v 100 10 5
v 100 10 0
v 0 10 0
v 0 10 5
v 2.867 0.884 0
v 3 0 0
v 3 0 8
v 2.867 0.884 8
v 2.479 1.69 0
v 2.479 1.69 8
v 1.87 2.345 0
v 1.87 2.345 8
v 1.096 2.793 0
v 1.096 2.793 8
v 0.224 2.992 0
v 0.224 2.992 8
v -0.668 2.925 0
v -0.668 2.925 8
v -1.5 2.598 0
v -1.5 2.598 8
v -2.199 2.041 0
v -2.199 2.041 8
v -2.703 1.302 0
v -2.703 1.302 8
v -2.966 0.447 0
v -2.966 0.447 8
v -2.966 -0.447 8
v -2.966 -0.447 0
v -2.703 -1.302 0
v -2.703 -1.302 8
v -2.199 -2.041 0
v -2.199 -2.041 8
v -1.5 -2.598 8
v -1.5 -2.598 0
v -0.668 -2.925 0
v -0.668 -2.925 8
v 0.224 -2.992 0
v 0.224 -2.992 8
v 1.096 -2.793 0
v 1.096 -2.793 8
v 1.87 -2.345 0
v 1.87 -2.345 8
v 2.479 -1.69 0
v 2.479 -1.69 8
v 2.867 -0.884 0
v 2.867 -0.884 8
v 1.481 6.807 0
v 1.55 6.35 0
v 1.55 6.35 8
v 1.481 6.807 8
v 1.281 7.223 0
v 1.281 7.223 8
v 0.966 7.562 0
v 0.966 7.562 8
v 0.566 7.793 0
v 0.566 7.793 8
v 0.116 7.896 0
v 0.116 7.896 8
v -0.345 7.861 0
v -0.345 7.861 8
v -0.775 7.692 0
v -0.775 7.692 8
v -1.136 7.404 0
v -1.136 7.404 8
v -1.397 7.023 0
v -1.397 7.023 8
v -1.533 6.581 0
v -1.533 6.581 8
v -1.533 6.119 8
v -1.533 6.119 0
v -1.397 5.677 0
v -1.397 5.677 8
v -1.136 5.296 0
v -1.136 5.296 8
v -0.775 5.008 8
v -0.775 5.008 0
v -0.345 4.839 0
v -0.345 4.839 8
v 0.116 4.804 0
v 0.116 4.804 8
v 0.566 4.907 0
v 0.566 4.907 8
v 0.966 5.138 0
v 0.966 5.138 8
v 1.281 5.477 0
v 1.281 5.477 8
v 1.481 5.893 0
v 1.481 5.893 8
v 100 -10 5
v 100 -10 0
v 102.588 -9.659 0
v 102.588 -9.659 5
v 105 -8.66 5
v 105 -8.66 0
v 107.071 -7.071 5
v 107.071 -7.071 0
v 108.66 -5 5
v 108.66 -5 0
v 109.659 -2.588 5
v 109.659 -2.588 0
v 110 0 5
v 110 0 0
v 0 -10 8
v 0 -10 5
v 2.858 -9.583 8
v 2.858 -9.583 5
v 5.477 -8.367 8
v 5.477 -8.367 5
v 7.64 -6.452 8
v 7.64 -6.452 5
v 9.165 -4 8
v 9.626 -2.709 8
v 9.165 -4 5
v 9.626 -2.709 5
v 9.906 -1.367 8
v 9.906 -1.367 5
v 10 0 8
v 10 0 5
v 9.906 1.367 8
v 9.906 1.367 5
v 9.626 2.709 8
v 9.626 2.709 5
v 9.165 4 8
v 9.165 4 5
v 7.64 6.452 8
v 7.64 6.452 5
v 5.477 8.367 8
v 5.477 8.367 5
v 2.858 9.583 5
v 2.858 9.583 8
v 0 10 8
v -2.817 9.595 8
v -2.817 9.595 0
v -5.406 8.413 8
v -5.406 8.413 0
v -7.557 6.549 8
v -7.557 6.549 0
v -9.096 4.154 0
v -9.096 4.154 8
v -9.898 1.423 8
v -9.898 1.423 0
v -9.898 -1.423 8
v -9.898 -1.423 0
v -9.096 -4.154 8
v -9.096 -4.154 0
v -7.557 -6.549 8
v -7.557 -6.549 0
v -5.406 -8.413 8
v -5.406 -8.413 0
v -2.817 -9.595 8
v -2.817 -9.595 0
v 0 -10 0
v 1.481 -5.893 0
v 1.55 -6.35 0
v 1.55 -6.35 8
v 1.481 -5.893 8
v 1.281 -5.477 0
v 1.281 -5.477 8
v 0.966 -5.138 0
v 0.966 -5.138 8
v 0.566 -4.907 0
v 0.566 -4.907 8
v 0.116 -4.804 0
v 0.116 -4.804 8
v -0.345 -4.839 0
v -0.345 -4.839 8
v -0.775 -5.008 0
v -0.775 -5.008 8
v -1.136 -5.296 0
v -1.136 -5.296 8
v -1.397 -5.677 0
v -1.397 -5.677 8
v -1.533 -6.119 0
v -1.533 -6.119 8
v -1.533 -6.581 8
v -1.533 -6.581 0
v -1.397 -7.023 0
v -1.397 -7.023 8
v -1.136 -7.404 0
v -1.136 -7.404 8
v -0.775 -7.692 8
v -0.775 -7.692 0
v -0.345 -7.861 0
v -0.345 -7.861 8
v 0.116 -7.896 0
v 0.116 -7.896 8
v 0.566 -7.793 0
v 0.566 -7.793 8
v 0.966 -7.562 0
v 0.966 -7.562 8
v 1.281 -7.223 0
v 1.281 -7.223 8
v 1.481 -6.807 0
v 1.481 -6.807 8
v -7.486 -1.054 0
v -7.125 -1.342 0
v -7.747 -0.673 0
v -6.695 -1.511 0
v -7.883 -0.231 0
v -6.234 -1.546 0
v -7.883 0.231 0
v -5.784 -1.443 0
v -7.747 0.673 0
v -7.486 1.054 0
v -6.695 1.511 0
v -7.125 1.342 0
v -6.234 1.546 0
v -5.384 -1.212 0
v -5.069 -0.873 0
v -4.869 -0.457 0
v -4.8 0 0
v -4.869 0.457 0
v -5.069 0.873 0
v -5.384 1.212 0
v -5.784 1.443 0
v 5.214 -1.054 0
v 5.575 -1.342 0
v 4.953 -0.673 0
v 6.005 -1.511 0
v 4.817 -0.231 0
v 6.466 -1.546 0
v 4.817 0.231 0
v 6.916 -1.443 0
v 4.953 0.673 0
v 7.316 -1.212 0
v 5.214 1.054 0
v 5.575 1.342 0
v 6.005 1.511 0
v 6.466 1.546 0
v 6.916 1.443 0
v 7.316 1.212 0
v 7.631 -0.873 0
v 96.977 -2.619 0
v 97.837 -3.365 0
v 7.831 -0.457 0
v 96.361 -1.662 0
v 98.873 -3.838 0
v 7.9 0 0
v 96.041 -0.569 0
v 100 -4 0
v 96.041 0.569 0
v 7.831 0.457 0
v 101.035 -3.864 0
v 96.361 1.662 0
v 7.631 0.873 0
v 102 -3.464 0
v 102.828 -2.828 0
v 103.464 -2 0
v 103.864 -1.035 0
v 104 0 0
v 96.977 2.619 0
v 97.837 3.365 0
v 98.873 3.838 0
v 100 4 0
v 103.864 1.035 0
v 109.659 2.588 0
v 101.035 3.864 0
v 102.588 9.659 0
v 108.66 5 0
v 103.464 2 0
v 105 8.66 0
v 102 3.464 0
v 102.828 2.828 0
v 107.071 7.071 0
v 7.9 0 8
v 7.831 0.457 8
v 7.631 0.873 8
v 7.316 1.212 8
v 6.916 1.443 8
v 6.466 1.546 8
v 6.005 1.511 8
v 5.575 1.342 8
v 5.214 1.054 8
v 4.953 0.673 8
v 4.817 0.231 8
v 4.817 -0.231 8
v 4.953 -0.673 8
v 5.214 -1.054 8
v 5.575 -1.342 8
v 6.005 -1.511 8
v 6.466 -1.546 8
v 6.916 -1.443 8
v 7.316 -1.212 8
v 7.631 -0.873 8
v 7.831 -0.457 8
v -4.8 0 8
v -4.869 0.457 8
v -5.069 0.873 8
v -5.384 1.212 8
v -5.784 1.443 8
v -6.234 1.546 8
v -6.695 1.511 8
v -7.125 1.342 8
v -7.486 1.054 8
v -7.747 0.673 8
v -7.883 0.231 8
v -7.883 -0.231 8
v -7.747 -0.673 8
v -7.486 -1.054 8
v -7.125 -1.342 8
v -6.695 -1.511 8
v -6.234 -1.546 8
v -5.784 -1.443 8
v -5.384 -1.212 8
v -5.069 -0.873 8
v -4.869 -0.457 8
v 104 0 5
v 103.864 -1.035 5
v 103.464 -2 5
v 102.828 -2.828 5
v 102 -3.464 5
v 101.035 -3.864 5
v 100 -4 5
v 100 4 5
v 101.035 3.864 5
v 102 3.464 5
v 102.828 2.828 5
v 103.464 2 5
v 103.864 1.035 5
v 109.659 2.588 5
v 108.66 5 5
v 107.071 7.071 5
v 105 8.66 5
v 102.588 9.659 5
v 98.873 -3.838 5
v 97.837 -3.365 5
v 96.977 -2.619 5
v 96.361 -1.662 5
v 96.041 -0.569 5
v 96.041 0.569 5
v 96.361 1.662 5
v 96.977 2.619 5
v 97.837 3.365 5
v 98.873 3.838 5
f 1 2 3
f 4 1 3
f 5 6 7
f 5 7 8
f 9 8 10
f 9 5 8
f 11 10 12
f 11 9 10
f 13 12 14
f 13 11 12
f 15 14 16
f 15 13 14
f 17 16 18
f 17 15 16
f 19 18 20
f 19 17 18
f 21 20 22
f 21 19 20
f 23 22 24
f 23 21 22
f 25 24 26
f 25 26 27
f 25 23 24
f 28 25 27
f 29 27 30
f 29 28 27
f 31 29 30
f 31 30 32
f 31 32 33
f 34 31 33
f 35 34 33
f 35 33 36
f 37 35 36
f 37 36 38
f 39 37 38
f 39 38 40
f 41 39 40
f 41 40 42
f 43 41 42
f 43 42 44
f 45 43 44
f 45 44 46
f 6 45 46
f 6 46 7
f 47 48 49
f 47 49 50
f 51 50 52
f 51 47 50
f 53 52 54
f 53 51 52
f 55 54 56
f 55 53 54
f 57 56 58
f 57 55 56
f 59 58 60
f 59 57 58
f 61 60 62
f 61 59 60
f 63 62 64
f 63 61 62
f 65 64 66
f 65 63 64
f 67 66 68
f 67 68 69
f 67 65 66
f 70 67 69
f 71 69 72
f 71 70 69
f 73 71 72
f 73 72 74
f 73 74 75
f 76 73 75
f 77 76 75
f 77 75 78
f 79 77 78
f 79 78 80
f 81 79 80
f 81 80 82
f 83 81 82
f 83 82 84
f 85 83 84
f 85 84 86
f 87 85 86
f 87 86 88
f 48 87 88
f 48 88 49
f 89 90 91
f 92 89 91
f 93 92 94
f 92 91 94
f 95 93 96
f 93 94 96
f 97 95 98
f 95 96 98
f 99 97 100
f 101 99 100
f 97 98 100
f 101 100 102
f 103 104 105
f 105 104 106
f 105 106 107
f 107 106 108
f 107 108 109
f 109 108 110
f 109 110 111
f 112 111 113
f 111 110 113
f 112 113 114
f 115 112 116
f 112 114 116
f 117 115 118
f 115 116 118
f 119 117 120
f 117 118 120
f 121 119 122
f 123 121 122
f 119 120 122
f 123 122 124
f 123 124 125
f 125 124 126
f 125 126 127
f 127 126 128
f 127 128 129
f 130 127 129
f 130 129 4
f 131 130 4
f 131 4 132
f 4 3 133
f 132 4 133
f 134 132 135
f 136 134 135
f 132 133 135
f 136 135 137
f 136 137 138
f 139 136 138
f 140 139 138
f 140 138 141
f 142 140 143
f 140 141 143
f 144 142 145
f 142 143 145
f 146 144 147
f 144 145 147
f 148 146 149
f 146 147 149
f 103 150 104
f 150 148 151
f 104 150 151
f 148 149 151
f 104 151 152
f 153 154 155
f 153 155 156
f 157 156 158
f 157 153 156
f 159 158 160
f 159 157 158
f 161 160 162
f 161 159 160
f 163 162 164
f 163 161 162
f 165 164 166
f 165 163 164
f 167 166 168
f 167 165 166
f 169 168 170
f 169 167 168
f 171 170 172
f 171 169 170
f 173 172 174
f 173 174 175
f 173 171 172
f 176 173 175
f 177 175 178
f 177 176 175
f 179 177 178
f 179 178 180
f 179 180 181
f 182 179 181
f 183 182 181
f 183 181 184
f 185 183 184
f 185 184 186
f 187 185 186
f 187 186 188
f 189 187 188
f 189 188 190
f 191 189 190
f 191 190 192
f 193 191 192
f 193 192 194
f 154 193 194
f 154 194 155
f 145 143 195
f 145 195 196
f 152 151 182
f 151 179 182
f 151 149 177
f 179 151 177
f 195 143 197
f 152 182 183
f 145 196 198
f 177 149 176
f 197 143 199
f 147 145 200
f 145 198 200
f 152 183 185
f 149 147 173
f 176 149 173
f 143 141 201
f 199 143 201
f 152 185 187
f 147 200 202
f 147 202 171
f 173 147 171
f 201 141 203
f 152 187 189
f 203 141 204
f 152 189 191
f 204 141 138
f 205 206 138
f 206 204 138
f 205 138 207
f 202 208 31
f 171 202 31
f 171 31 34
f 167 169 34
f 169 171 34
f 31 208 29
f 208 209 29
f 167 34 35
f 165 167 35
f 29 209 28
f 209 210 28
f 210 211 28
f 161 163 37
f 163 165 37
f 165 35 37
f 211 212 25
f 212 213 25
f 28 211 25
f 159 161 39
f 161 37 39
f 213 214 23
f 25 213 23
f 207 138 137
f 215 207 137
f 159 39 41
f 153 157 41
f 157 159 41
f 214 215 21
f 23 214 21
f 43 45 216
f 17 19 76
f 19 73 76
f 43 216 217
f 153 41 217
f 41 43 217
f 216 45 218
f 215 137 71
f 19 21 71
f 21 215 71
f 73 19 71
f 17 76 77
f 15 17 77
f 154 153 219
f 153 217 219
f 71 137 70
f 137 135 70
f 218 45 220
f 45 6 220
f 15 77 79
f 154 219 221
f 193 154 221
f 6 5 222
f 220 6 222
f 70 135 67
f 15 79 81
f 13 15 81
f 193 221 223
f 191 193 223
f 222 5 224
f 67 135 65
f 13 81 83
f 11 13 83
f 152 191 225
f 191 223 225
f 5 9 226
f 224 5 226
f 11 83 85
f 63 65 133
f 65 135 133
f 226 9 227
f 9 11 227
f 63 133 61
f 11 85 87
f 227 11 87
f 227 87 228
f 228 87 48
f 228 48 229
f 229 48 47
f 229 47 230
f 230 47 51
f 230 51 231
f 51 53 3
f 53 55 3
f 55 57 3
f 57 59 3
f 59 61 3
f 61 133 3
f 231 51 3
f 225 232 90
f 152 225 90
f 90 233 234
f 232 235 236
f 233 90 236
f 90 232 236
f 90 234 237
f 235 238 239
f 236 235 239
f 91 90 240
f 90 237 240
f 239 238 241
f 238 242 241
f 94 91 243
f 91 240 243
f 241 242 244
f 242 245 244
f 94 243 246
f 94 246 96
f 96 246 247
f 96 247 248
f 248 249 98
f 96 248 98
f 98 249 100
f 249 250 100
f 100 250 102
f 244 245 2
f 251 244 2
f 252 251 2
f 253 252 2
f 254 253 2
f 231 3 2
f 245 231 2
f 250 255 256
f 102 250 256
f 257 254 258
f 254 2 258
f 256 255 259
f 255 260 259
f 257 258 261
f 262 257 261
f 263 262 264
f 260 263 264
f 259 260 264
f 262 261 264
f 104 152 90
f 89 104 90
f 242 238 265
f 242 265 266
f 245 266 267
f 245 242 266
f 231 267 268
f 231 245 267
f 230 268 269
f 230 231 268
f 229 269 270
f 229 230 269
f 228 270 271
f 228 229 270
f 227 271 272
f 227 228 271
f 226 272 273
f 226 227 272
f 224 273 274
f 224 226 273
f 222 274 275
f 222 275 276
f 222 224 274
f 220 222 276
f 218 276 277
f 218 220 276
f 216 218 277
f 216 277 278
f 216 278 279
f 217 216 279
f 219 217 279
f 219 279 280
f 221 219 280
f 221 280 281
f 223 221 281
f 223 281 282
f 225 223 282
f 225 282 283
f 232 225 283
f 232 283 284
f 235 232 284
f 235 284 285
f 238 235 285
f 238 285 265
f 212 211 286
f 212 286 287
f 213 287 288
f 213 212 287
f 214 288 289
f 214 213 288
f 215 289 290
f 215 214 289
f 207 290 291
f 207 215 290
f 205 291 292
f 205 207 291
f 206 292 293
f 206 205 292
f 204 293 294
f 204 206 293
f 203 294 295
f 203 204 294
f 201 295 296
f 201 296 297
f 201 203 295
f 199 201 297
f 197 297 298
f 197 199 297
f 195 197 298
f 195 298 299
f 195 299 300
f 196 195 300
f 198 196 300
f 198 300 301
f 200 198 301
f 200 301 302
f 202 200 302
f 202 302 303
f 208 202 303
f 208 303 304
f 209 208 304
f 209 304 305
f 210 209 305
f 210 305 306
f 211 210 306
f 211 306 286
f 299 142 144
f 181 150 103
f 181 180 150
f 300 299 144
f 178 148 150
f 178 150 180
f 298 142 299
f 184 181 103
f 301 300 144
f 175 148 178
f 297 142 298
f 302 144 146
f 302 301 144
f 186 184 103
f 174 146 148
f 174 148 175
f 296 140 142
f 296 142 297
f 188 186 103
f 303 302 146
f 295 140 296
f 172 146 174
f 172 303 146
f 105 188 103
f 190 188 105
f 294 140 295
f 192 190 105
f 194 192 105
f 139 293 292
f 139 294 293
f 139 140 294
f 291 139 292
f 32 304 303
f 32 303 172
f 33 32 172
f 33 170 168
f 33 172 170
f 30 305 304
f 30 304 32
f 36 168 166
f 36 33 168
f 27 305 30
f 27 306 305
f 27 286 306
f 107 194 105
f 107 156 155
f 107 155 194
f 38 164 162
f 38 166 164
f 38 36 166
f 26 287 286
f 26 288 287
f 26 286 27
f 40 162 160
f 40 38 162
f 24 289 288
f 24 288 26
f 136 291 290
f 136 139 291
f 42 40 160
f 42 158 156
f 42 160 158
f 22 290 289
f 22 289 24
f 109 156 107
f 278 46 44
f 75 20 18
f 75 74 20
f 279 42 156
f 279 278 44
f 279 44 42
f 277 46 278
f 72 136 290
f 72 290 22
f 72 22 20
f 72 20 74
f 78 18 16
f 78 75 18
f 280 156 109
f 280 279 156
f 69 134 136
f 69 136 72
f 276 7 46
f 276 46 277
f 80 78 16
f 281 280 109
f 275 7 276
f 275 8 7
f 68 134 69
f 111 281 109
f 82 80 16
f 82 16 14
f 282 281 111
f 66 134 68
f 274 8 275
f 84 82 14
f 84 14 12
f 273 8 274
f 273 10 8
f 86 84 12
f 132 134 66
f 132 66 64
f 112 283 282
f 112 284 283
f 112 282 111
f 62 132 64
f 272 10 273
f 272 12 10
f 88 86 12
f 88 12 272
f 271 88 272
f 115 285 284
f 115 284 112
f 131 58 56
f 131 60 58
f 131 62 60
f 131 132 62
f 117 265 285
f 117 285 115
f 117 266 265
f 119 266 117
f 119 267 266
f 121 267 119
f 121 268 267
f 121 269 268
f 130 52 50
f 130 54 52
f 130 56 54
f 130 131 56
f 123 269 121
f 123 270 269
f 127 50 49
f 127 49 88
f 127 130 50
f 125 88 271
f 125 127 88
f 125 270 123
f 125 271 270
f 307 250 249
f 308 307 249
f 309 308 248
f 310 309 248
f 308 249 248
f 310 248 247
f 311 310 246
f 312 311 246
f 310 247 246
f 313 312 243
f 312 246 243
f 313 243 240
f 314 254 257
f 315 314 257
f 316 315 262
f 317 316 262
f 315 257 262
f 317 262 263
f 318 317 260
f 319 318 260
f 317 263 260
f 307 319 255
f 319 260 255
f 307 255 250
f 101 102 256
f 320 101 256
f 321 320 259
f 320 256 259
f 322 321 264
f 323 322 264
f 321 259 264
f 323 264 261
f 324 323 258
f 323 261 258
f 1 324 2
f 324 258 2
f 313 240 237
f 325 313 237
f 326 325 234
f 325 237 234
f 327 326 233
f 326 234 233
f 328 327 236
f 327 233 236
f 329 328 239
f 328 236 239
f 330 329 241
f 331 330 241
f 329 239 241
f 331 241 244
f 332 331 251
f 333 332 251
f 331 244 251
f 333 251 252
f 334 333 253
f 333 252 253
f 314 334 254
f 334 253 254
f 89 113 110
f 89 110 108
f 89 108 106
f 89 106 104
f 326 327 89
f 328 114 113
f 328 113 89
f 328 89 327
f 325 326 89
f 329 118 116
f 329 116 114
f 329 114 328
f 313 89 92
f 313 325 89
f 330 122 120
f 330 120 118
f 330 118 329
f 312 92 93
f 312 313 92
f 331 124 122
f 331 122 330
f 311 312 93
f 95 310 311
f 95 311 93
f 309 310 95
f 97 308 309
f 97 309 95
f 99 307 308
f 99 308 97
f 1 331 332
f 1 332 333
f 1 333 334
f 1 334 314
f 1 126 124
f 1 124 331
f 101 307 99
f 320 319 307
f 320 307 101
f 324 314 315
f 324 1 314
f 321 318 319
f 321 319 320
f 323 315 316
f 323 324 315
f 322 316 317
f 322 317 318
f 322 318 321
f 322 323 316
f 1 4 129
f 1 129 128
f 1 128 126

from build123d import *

# Parameters (mm, degrees)
F0_R     = 1.55
F0_R_2   = 3
F1_DEPTH = 5
F2_DEPTH = 8


with BuildPart() as f1:
    # F0 (on Top) → F1 (new body)
    with BuildSketch(Plane.XY):
        with BuildLine():
            ThreePointArc((9.1651513899, -4), (9.7890631293, -2.0430964369), (10, 0))
            ThreePointArc((10, 0), (9.7890631293, 2.0430964369), (9.1651513899, 4))
            ThreePointArc((9.1651513899, 4), (5.4772255751, 8.3666002653), (0, 10))
            ThreePointArc((0, 10), (-10, 0), (0, -10))
            ThreePointArc((0, -10), (5.4772255751, -8.3666002653), (9.1651513899, -4))
        make_face()
        with Locations((0, -6.35)):
            Circle(F0_R, mode=Mode.SUBTRACT)
        with Locations((-6.35, 0)):
            Circle(F0_R, mode=Mode.SUBTRACT)
        Circle(F0_R_2, mode=Mode.SUBTRACT)
        with Locations((6.35, 0)):
            Circle(F0_R, mode=Mode.SUBTRACT)
        with Locations((0, 6.35)):
            Circle(F0_R, mode=Mode.SUBTRACT)
        with BuildLine():
            ThreePointArc((0, 10), (5.4772255751, 8.3666002653), (9.1651513899, 4))
            Line((9.1651513899, 4), (90.8348486101, 4))
            ThreePointArc((90.8348486101, 4), (94.5227744249, 8.3666002653), (100, 10))
            Line((100, 10), (0, 10))
        make_face()
        with BuildLine():
            ThreePointArc((100, 10), (94.5227744249, 8.3666002653), (90.8348486101, 4))
            Line((90.8348486101, 4), (100, 4))
            ThreePointArc((100, 4), (102.8284271247, 2.8284271247), (104, 0))
            ThreePointArc((104, 0), (102.8284271247, -2.8284271247), (100, -4))
            Line((100, -4), (90.8348486101, -4))
            ThreePointArc((90.8348486101, -4), (94.5227744249, -8.3666002653), (100, -10))
            ThreePointArc((100, -10), (107.0710678119, -7.0710678119), (110, 0))
            ThreePointArc((110, 0), (107.0710678119, 7.0710678119), (100, 10))
        make_face()
        with BuildLine():
            Line((90.8348486101, -4), (9.1651513899, -4))
            ThreePointArc((9.1651513899, -4), (5.4772255751, -8.3666002653), (0, -10))
            Line((0, -10), (100, -10))
            ThreePointArc((100, -10), (94.5227744249, -8.3666002653), (90.8348486101, -4))
        make_face()
        with BuildLine():
            ThreePointArc((9.1651513899, 4), (9.7890631293, 2.0430964369), (10, 0))
            ThreePointArc((10, 0), (9.7890631293, -2.0430964369), (9.1651513899, -4))
            Line((9.1651513899, -4), (90.8348486101, -4))
            ThreePointArc((90.8348486101, -4), (90, 0), (90.8348486101, 4))
            Line((90.8348486101, 4), (9.1651513899, 4))
        make_face()
        with BuildLine():
            Line((100, 4), (90.8348486101, 4))
            ThreePointArc((90.8348486101, 4), (90, 0), (90.8348486101, -4))
            Line((90.8348486101, -4), (100, -4))
            ThreePointArc((100, -4), (96, 0), (100, 4))
        make_face()
    extrude(amount=F1_DEPTH)

    # F0 (on Top) → F2 (join)
    with BuildSketch(Plane.XY):
        with BuildLine():
            ThreePointArc((9.1651513899, -4), (9.7890631293, -2.0430964369), (10, 0))
            ThreePointArc((10, 0), (9.7890631293, 2.0430964369), (9.1651513899, 4))
            ThreePointArc((9.1651513899, 4), (5.4772255751, 8.3666002653), (0, 10))
            ThreePointArc((0, 10), (-10, 0), (0, -10))
            ThreePointArc((0, -10), (5.4772255751, -8.3666002653), (9.1651513899, -4))
        make_face()
        with Locations((0, -6.35)):
            Circle(F0_R, mode=Mode.SUBTRACT)
        with Locations((-6.35, 0)):
            Circle(F0_R, mode=Mode.SUBTRACT)
        Circle(F0_R_2, mode=Mode.SUBTRACT)
        with Locations((6.35, 0)):
            Circle(F0_R, mode=Mode.SUBTRACT)
        with Locations((0, 6.35)):
            Circle(F0_R, mode=Mode.SUBTRACT)
    extrude(amount=F2_DEPTH)


solid = f1.part
